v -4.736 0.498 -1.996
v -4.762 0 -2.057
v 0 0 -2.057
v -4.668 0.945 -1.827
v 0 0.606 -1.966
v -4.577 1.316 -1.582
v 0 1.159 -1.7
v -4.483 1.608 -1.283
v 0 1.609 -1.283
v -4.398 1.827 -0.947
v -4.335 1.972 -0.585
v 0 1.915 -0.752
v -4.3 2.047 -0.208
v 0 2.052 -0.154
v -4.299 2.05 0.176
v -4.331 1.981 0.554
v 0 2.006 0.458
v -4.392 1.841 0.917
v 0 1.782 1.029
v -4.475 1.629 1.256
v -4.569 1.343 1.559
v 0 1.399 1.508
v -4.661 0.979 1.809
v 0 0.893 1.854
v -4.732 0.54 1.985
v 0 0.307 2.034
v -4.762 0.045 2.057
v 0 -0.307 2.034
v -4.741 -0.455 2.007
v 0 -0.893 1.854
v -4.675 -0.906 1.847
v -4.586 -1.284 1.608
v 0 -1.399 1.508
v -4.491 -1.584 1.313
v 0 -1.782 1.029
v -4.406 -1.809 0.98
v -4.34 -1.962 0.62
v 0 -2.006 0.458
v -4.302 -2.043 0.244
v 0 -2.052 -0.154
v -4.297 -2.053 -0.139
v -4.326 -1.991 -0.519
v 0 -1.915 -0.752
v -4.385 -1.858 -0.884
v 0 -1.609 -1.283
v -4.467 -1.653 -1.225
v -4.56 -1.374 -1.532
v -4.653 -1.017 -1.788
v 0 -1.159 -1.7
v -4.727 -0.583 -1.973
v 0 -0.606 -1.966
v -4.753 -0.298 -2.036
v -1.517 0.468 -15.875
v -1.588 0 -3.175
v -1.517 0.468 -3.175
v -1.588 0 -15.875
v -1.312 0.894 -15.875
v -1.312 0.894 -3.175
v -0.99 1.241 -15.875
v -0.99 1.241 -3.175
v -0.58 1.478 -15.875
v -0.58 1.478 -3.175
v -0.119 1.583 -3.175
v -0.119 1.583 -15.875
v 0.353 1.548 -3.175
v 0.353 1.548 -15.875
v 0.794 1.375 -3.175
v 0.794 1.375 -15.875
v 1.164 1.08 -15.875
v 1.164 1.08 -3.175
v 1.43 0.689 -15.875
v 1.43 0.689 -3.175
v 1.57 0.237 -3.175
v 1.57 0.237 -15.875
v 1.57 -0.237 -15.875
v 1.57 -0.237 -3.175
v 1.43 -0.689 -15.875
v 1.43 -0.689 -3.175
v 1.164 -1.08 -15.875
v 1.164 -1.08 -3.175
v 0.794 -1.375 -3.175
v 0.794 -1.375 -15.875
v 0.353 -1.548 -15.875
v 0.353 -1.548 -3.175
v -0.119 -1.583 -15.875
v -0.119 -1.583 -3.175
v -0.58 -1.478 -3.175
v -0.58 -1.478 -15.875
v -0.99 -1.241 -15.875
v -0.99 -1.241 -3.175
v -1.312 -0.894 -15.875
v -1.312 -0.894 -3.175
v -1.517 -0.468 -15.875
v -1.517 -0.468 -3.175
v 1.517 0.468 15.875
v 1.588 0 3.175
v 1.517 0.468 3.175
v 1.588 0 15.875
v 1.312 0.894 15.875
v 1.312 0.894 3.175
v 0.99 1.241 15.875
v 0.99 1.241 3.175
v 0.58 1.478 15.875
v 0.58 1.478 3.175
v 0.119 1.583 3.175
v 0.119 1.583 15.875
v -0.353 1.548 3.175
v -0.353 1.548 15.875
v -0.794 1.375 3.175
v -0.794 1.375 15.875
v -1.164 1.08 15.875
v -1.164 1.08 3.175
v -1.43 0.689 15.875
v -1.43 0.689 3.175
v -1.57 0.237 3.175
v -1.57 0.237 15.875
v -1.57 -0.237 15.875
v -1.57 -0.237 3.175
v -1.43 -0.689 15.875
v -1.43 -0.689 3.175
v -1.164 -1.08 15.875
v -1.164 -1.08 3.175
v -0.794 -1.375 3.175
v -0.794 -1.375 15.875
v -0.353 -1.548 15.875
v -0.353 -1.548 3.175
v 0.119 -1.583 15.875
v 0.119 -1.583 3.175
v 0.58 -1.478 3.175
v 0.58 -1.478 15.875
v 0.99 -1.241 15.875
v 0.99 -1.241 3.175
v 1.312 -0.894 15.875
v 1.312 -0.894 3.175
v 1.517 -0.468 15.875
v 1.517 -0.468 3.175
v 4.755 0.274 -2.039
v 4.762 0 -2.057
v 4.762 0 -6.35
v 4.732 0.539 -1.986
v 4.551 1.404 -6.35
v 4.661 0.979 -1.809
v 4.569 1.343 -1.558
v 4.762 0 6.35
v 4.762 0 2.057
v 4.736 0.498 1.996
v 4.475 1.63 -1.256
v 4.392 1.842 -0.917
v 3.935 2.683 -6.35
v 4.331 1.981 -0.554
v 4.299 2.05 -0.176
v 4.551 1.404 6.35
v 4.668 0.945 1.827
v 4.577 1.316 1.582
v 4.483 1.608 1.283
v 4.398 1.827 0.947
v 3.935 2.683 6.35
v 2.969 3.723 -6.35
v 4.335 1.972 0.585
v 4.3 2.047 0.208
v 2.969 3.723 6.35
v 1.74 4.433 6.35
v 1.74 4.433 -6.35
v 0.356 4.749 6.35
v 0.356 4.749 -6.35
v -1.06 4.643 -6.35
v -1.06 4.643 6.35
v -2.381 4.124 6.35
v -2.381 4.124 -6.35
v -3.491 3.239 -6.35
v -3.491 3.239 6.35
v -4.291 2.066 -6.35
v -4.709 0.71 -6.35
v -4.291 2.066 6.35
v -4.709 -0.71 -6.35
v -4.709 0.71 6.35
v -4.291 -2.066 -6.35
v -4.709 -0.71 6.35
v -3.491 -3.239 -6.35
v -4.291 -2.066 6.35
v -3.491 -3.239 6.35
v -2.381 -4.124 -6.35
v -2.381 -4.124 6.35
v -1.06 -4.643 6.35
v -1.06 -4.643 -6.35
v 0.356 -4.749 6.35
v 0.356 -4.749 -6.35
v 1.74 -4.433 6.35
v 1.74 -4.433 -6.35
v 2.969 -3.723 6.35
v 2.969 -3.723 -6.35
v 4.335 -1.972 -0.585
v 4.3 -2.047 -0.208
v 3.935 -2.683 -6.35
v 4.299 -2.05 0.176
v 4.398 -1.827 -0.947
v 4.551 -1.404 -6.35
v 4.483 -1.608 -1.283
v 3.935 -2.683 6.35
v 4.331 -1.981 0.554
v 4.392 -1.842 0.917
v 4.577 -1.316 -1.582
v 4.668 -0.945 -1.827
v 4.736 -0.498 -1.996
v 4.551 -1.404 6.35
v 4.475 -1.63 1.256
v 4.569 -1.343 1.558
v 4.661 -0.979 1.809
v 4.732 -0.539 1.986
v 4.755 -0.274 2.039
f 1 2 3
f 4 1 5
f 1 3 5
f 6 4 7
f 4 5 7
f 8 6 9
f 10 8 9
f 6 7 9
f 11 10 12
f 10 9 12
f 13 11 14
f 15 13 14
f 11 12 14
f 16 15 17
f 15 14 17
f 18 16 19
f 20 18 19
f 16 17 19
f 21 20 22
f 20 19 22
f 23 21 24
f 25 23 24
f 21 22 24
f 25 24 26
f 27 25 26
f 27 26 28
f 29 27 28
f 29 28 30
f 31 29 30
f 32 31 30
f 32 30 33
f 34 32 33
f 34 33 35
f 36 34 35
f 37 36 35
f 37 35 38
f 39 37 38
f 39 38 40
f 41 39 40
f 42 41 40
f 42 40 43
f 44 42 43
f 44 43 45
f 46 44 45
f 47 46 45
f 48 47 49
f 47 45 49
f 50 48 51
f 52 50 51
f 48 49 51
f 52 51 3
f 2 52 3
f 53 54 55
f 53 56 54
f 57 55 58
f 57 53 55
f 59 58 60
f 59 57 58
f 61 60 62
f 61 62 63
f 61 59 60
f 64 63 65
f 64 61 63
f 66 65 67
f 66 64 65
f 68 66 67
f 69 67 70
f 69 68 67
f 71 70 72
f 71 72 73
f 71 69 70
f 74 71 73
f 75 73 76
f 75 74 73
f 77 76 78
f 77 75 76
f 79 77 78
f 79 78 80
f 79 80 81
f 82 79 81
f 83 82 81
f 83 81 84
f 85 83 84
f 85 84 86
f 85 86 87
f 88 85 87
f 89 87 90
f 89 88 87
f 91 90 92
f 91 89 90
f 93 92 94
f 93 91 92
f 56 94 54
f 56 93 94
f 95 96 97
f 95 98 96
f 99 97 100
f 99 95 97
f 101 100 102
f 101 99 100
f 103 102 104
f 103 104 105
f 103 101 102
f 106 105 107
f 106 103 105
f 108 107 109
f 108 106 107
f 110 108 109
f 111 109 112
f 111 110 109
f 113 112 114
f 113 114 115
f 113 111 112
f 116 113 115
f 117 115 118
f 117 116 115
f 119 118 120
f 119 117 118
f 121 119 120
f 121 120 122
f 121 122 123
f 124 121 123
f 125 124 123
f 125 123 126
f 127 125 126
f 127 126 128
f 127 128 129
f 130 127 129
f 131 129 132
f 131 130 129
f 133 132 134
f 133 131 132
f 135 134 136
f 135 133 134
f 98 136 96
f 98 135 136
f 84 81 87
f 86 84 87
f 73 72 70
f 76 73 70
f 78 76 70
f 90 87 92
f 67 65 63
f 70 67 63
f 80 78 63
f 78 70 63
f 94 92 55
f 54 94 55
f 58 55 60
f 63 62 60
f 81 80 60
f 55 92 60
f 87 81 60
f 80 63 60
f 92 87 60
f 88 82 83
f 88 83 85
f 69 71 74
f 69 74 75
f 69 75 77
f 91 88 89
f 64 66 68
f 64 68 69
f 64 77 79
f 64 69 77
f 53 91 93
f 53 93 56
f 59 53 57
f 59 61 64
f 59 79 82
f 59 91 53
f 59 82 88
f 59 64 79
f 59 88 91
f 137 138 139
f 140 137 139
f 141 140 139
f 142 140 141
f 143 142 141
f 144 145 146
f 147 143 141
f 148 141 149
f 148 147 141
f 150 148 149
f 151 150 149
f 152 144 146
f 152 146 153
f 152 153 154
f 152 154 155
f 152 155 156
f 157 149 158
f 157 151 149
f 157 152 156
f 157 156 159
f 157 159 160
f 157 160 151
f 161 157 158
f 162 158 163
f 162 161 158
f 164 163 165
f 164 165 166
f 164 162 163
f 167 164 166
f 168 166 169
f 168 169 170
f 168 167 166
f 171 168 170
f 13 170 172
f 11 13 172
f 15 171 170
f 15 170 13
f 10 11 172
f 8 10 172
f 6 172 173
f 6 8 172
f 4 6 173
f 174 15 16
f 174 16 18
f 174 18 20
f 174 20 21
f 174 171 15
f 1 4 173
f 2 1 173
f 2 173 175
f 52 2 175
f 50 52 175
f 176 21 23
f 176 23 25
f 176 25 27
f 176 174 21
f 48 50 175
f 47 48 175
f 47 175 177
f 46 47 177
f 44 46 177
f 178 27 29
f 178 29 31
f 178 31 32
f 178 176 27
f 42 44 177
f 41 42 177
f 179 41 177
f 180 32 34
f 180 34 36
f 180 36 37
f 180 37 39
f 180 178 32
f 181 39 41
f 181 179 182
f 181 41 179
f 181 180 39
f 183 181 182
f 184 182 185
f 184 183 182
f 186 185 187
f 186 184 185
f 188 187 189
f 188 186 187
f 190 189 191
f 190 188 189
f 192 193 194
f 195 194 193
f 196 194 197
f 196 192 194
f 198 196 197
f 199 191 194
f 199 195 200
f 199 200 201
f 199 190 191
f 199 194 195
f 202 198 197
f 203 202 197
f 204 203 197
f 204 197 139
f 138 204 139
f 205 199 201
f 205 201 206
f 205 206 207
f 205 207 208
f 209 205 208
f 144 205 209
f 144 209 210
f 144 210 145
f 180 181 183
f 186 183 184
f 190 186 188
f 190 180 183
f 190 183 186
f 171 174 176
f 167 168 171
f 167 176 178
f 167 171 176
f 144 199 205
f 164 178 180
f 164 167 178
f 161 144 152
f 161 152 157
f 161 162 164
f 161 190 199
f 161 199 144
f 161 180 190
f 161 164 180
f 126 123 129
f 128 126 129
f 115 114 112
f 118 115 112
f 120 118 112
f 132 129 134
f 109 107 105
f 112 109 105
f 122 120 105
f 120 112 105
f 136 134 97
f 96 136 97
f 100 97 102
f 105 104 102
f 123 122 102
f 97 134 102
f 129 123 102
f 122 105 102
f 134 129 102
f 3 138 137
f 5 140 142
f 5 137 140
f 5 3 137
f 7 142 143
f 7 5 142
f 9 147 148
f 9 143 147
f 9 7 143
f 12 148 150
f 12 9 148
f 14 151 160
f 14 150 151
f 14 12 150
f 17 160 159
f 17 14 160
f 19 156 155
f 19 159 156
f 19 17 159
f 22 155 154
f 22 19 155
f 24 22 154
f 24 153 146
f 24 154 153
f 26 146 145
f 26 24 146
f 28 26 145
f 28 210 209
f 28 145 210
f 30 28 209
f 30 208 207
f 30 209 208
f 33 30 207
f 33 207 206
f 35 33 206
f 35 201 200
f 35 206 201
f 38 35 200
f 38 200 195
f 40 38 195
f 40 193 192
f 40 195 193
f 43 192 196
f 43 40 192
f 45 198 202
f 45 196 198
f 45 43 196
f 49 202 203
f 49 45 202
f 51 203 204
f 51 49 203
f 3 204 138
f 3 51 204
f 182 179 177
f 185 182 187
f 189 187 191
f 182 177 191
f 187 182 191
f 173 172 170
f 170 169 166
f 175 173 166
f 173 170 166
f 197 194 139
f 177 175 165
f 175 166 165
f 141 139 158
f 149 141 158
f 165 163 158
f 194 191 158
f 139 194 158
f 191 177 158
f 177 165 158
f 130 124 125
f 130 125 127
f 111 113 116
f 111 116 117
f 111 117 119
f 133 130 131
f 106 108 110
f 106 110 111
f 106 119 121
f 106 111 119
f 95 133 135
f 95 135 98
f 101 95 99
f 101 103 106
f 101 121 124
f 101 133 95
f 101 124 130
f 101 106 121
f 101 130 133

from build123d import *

# Parameters (mm, degrees)
SKETCH1_R                      = 4.7625
EXTRUDE1_DEPTH                 = 6.35
EXTRUDE1_DEPTH_BACK            = 6.35
CUT_EXTRUDE1_REACH             = 6.763
SKETCH2_R                      = 2.0574
CUT_EXTRUDE1_DIRECTION_2_REACH = 6.763
SKETCH3_R                      = 1.5875
EXTRUDE2_DEPTH                 = 9.525
EXTRUDE2_DEPTH_BACK            = 3.175
SKETCH4_R                      = 1.5875
EXTRUDE3_DEPTH                 = 9.525
EXTRUDE3_DEPTH_BACK            = 3.175


with BuildPart() as part:
    # Sketch1 → Extrude1 (new body, two sides)
    with BuildSketch(Plane.XY) as extrude1_sk:
        Circle(SKETCH1_R)
    extrude(amount=EXTRUDE1_DEPTH)
    extrude(extrude1_sk.sketch, amount=-EXTRUDE1_DEPTH_BACK)

    # Sketch2 → Cut-Extrude1 (cut, up to next)
    with BuildSketch(Plane(origin=(0, 0, 0), x_dir=(0, 0, -1), z_dir=(1, 0, 0)), mode=Mode.PRIVATE) as cut_extrude1_sk1:
        Circle(SKETCH2_R)
    cut_extrude1_tool1 = extrude(cut_extrude1_sk1.sketch, amount=-CUT_EXTRUDE1_REACH, mode=Mode.PRIVATE) & part.part
    add(cut_extrude1_tool1.solids().sort_by_distance((0, 0, 0))[0], mode=Mode.SUBTRACT)

    # Sketch2 → Cut-Extrude1 direction 2 (cut, up to next)
    with BuildSketch(Plane(origin=(0, 0, 0), x_dir=(0, 0, -1), z_dir=(1, 0, 0)), mode=Mode.PRIVATE) as cut_extrude1_direction_2_sk1:
        Circle(SKETCH2_R)
    cut_extrude1_direction_2_tool1 = extrude(cut_extrude1_direction_2_sk1.sketch, amount=CUT_EXTRUDE1_DIRECTION_2_REACH, mode=Mode.PRIVATE) & part.part
    add(cut_extrude1_direction_2_tool1.solids().sort_by_distance((0, 0, 0))[0], mode=Mode.SUBTRACT)


with BuildPart() as body_2:
    # Sketch3 → Extrude2 (new body, two sides)
    with BuildSketch(Plane.XY.offset(6.35)) as extrude2_sk:
        Circle(SKETCH3_R)
    extrude(amount=EXTRUDE2_DEPTH)
    extrude(extrude2_sk.sketch, amount=-EXTRUDE2_DEPTH_BACK)


with BuildPart() as body_3:
    # Sketch4 → Extrude3 (new body, two sides)
    with BuildSketch(Plane(origin=(0, 0, -6.35), x_dir=(-1, 0, 0), z_dir=(0, 0, -1))) as extrude3_sk:
        Circle(SKETCH4_R)
    extrude(amount=EXTRUDE3_DEPTH)
    extrude(extrude3_sk.sketch, amount=-EXTRUDE3_DEPTH_BACK)


solid = Compound([part.part, body_2.part, body_3.part])
